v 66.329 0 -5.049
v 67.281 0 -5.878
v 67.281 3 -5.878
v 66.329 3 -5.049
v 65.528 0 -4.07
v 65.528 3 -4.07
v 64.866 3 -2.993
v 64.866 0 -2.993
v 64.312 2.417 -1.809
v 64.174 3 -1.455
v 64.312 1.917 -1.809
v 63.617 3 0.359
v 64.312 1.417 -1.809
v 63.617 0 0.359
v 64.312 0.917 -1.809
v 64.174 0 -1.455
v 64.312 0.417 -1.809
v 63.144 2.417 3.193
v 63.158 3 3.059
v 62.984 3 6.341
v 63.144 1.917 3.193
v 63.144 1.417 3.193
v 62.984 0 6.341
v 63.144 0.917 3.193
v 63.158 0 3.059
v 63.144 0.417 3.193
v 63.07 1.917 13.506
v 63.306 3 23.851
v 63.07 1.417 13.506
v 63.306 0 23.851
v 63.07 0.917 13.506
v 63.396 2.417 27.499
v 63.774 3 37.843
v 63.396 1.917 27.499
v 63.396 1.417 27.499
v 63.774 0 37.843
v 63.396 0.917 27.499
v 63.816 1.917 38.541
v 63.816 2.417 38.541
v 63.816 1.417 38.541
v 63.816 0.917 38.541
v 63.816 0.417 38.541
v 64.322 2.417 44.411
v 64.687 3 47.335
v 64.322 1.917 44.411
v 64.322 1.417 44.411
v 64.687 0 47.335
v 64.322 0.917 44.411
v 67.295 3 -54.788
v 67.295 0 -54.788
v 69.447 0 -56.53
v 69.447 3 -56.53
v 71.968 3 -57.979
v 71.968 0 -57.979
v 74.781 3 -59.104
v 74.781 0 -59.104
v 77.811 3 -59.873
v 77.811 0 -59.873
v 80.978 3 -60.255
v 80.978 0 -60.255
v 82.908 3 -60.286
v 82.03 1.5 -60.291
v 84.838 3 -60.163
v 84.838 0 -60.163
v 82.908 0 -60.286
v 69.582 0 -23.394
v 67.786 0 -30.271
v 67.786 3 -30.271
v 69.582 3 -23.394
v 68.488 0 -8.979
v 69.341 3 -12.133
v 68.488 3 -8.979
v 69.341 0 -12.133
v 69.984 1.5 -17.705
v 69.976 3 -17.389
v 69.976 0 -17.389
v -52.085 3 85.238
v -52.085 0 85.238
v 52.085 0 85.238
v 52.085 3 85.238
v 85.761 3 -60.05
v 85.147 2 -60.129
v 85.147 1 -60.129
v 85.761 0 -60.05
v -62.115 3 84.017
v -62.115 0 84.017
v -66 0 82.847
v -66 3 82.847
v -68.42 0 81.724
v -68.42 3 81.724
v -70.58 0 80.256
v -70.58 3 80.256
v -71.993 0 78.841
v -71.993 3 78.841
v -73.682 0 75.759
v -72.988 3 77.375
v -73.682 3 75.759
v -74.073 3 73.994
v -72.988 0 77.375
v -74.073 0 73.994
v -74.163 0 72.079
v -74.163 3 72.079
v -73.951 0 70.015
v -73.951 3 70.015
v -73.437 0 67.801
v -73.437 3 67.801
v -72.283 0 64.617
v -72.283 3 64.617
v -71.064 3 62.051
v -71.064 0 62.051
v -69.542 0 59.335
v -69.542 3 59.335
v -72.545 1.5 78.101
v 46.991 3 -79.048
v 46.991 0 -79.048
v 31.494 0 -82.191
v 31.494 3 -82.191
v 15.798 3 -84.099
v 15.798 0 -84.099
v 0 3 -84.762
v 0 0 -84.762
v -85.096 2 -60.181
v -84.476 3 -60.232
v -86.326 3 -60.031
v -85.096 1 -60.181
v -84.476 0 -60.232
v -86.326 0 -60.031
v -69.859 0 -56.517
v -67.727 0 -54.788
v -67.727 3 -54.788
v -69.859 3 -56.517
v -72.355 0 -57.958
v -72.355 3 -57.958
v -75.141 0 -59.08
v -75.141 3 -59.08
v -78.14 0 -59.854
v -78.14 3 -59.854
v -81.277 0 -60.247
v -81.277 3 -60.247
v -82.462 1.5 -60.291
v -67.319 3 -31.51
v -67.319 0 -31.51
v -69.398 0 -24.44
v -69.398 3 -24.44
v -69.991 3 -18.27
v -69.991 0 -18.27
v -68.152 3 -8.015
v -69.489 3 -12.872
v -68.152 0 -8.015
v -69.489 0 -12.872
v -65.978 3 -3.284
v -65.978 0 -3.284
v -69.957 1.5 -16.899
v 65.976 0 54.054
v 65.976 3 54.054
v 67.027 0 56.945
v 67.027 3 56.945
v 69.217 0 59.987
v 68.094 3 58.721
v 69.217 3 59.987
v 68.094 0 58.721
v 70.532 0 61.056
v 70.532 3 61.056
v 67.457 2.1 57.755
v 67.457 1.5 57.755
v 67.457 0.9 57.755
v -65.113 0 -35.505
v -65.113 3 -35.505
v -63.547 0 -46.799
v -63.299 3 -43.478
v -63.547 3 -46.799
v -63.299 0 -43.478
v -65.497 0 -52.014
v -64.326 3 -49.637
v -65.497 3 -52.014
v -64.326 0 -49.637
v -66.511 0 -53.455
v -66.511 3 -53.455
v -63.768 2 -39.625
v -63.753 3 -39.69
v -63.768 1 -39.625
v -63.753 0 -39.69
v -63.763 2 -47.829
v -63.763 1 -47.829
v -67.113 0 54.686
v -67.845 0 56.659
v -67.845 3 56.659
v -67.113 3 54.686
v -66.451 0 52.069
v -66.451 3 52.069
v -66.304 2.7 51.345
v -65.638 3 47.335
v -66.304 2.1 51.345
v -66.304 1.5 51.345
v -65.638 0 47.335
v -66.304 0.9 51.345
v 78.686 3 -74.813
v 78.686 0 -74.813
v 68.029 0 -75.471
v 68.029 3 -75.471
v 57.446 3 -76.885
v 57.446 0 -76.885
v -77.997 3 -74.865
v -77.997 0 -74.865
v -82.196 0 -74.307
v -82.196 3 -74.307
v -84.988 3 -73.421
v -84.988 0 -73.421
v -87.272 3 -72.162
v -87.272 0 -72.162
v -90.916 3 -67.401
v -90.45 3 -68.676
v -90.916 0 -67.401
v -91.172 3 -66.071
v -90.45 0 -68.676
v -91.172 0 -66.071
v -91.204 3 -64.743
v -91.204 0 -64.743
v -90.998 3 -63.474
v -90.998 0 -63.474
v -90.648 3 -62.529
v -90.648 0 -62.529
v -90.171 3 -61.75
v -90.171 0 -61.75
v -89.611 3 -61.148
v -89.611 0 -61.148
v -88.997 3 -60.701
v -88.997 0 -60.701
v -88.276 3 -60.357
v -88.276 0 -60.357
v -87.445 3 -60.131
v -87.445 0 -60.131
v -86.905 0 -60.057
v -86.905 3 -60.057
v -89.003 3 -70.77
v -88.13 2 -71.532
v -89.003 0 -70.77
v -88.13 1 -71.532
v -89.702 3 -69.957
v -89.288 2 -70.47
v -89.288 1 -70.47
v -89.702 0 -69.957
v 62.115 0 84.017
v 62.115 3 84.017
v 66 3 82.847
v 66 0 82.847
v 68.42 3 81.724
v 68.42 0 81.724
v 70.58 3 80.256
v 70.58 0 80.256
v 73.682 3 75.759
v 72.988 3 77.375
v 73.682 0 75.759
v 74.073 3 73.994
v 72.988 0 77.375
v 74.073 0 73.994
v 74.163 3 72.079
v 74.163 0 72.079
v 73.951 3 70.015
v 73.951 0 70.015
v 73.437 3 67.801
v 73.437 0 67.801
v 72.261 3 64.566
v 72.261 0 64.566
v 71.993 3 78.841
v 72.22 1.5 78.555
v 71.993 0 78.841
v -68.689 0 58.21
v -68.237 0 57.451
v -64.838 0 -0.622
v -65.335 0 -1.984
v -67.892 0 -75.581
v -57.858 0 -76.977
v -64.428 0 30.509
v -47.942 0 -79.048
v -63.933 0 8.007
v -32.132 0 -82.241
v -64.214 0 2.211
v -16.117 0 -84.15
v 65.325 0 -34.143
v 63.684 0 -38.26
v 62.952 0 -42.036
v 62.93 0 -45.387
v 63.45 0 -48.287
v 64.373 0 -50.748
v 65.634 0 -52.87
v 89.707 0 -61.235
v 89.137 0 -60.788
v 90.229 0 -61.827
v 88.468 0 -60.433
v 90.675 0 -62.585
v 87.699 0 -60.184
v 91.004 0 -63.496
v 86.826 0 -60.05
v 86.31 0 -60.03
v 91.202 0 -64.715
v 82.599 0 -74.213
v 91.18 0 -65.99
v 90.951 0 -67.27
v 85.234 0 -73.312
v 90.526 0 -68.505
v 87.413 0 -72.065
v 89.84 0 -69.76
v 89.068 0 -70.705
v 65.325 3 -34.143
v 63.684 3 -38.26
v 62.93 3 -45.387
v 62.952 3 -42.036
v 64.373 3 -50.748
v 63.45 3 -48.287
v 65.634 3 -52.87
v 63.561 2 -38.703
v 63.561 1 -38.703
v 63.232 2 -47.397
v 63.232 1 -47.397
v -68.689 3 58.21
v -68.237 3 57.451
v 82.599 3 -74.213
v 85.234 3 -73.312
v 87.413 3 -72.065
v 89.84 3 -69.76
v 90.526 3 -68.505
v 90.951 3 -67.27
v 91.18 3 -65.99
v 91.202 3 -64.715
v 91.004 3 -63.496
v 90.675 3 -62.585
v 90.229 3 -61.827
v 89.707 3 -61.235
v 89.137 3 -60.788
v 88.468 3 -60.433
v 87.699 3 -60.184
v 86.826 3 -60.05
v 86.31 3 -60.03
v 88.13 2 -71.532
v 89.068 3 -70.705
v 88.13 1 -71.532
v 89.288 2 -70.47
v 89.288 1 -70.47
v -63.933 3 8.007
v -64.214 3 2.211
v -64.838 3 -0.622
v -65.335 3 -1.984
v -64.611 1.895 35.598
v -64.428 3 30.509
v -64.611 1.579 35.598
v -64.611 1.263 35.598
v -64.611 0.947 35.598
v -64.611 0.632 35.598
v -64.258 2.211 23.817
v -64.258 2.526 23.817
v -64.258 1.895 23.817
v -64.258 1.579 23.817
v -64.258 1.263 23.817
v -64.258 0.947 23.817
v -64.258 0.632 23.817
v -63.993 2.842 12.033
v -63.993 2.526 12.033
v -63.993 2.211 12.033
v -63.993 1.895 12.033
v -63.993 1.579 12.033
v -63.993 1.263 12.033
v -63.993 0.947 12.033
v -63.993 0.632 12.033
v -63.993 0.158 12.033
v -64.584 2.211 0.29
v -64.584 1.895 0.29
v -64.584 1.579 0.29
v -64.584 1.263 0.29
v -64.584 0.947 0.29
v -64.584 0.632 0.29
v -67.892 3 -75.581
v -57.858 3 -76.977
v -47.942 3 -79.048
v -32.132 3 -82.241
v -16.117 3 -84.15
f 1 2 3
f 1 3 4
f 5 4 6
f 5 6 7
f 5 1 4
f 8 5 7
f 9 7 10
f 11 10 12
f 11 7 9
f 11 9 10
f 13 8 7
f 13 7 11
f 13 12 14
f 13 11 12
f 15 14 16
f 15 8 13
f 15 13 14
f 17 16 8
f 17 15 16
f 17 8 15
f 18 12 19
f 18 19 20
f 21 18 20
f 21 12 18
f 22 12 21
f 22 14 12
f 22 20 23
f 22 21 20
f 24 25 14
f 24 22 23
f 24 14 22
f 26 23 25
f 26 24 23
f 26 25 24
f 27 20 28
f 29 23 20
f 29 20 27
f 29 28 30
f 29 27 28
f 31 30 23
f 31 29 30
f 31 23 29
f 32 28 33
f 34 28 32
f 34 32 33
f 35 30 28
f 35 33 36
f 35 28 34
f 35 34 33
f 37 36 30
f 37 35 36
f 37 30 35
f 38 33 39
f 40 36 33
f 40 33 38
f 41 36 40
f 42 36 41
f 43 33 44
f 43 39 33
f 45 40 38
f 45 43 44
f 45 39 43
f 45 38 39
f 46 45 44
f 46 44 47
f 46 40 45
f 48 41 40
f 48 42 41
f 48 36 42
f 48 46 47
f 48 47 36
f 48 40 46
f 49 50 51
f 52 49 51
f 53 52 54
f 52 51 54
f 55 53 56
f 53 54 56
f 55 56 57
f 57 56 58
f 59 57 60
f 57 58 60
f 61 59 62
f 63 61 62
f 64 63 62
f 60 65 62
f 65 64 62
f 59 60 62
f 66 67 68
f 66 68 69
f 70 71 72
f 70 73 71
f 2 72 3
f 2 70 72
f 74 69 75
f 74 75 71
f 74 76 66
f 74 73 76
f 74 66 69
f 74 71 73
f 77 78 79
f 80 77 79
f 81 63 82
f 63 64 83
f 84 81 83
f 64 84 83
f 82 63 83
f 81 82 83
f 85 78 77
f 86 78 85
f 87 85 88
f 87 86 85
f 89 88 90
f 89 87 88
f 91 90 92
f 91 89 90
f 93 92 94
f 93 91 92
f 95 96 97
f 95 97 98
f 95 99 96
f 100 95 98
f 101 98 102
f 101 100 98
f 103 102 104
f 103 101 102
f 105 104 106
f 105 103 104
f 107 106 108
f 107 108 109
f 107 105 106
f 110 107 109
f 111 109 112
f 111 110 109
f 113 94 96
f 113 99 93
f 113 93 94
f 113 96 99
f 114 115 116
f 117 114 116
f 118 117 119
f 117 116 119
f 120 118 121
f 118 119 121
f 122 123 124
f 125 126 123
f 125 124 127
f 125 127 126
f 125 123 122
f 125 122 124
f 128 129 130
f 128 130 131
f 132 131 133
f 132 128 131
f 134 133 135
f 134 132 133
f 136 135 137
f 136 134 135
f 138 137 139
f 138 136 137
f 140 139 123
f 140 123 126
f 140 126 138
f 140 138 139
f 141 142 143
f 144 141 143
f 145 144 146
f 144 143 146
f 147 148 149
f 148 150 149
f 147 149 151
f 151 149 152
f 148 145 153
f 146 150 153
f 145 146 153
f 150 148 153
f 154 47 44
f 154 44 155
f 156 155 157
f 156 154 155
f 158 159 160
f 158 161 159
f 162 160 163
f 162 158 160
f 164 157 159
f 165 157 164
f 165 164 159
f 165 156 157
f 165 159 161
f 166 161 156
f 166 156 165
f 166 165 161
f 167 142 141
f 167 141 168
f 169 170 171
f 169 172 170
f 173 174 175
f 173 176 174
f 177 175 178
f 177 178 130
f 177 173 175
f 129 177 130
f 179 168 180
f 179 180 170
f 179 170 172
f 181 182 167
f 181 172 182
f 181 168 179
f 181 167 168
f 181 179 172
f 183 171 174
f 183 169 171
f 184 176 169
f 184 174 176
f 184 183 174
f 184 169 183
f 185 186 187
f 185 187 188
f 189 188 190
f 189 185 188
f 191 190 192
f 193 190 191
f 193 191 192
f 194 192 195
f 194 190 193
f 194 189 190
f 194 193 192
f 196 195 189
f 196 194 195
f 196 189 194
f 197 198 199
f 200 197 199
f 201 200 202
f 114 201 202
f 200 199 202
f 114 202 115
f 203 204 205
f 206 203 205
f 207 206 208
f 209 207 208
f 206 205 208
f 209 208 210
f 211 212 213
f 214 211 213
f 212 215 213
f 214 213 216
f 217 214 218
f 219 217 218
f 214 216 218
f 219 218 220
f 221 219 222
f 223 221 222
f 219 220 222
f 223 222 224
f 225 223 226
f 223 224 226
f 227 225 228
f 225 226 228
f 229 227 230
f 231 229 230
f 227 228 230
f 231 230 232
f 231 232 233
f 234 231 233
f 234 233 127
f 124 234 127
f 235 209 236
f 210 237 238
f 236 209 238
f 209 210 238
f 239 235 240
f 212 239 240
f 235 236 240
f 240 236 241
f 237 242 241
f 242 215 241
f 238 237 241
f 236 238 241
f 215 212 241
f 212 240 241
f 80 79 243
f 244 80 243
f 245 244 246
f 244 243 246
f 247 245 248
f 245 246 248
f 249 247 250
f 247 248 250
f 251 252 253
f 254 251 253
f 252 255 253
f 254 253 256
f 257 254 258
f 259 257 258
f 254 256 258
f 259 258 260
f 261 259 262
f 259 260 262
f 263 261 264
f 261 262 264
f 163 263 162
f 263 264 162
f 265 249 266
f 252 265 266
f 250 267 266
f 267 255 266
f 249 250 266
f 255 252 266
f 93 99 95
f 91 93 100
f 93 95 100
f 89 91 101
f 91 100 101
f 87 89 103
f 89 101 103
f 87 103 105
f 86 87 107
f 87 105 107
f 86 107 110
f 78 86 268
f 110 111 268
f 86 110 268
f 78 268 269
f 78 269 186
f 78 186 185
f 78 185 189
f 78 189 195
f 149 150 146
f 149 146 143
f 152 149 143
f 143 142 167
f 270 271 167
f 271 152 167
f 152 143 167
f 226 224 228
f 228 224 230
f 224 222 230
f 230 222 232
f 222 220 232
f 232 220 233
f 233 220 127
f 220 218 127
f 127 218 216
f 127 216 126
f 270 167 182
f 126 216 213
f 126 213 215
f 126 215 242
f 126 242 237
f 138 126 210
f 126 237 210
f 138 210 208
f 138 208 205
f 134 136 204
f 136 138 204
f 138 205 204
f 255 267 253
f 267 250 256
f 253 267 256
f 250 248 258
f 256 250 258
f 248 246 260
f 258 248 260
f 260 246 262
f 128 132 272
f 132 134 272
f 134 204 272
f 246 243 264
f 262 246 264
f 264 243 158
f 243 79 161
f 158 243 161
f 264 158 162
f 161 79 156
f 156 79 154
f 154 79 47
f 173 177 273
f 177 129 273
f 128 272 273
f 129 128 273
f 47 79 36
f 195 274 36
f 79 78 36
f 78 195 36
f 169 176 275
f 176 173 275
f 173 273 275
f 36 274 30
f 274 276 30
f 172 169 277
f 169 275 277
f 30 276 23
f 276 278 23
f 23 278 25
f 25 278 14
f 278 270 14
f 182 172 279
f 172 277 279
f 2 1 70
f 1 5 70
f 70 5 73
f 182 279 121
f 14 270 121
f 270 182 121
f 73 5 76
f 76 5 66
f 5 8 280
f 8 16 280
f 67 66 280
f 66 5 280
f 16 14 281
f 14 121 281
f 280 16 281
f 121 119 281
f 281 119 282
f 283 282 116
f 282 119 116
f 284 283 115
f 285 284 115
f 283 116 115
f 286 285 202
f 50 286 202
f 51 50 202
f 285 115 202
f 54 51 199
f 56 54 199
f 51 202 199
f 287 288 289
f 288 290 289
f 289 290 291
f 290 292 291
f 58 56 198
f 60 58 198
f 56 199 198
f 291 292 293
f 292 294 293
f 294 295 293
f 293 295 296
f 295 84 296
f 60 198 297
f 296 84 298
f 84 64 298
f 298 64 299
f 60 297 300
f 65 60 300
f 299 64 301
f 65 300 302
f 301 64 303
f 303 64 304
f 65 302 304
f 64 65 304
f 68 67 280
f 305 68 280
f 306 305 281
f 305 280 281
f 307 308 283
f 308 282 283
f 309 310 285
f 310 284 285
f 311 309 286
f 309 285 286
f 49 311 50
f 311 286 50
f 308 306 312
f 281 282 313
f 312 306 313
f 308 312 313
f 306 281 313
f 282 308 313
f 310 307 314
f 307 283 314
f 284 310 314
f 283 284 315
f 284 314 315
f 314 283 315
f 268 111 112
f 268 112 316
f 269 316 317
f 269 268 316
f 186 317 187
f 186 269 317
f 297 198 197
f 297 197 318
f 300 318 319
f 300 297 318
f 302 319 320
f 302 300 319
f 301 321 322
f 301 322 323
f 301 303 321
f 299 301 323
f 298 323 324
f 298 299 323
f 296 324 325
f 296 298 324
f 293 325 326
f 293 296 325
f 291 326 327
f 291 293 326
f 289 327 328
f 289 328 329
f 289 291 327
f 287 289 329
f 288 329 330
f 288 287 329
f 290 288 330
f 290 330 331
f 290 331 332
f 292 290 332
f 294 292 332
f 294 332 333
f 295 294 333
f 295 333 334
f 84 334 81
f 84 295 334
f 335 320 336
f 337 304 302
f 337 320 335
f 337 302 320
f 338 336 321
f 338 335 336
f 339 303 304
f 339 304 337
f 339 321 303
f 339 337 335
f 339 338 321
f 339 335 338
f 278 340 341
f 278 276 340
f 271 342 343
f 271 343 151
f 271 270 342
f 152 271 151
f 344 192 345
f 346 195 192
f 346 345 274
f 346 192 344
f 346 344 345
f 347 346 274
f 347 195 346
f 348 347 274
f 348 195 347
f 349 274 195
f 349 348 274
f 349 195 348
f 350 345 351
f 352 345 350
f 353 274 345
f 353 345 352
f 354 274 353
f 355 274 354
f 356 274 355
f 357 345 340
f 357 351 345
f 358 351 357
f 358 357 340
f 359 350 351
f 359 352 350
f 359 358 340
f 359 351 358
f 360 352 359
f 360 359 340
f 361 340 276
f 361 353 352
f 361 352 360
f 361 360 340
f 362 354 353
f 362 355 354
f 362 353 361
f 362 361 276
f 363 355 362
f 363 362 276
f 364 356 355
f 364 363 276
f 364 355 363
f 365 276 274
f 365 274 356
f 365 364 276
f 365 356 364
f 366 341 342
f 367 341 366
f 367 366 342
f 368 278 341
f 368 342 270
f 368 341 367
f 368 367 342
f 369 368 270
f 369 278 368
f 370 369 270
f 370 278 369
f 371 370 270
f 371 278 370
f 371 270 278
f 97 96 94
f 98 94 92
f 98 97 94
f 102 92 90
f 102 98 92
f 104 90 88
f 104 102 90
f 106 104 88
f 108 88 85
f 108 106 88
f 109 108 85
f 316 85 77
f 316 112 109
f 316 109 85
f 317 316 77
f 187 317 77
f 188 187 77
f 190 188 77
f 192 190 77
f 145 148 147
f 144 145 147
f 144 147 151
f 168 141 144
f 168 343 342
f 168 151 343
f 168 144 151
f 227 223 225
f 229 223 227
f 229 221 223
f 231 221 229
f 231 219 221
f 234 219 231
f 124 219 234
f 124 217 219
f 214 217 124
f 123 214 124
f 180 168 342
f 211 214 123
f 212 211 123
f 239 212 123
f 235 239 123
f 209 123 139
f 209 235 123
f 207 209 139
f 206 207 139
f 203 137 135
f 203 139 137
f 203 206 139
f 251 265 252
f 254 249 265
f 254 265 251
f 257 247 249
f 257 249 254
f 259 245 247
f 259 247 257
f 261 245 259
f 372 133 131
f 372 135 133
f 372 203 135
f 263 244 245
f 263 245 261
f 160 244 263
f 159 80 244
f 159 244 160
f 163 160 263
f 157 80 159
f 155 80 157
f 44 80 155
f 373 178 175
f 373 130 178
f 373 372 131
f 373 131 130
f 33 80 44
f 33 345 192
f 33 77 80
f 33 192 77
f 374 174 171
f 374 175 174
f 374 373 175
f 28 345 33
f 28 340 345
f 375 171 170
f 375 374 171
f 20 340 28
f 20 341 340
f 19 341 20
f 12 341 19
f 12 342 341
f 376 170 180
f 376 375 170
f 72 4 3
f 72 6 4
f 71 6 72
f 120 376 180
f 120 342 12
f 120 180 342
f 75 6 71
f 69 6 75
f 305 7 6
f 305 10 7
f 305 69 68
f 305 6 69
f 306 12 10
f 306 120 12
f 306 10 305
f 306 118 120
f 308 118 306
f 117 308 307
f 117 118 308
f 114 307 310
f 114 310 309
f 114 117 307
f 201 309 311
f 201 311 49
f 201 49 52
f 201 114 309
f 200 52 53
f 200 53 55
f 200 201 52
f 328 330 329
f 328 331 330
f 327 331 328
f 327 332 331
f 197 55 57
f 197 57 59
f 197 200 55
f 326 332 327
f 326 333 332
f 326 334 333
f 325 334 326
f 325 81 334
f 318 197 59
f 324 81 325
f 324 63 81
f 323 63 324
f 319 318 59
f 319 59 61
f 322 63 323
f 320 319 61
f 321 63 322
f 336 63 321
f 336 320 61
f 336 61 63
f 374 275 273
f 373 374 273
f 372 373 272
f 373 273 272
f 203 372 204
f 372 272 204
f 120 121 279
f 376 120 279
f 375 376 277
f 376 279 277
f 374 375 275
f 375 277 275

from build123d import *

# Parameters (mm, degrees)
EXTRUDE_1_DEPTH = 3


with BuildPart() as part:
    # 草图1 → 凸台-拉伸1 (new body)
    with BuildSketch(Plane(origin=(0, 0, 0), x_dir=(1, 0, 0), z_dir=(0, 1, 0))):
        with BuildLine():
            Line((0, -85.237738925), (52.08455714, -85.237738925))
            add(Edge.make_bspline(
                [(52.08455714, -85.237738925), (83.131353316, -83.963442969), (70.531928888, -61.056271567)],
                knots=[0, 0, 0, 0.91576418, 0.91576418, 0.91576418], degree=2))
            add(Edge.make_bspline(
                [(64.686979765, -47.335345252), (64.821728452, -48.22885898), (65.093128633, -50.015668979), (65.515155467, -52.234660938), (65.946662506, -53.991070652), (66.337115564, -55.291267739), (66.823261096, -56.557684193), (67.433421369, -57.768689415), (68.186549634, -58.894674775), (69.089475072, -59.904951843), (69.899928779, -60.600614164), (70.397522986, -60.962598407), (70.531928888, -61.056271567)],
                knots=[0, 0, 0, 0, 0.03125, 0.0625, 0.078125, 0.09375, 0.109375, 0.125, 0.140625, 0.15625, 0.171875, 0.177544855, 0.177544855, 0.177544855, 0.177544855], degree=3))
            add(Edge.make_bspline(
                [(67.281190845, 5.878024568), (66.896150113, 5.604067681), (66.17820277, 4.954075775), (65.443341839, 3.984844748), (64.938700468, 3.142617887), (64.602832741, 2.486533462), (64.306406192, 1.811794699), (64.046527331, 1.122513569), (63.82116748, 0.421125393), (63.628358492, -0.290103239), (63.466128453, -1.008847892), (63.332437978, -1.733031566), (63.224920724, -2.461279505), (63.112896984, -3.436590381), (63.04248237, -4.416759867), (63.002674943, -5.39935773), (62.985358555, -6.136929173), (62.977857057, -6.874572053), (62.977765693, -7.612059791), (62.982878051, -8.349301424), (62.991452287, -9.086301707), (63.002218337, -9.823125162), (63.018489212, -10.805396372), (63.040788209, -12.033099303), (63.117509988, -15.961444796), (63.209965223, -19.888985412), (63.30476302, -23.816659201), (63.346660287, -25.535031616), (63.38326061, -27.007933212), (63.421035997, -28.480829039), (63.466381834, -30.199198036), (63.537017062, -32.653910516), (63.649386664, -35.598757346), (63.806392131, -38.54169042), (64.021636354, -41.480498428), (64.260256253, -43.924290625), (64.493829102, -45.874662228), (64.622628022, -46.848447014), (64.686979765, -47.335345252)],
                knots=[0.42243117, 0.42243117, 0.42243117, 0.42243117, 0.4375, 0.453125, 0.4609375, 0.46875, 0.4765625, 0.484375, 0.4921875, 0.5, 0.5078125, 0.515625, 0.5234375, 0.53125, 0.546875, 0.5546875, 0.5625, 0.5703125, 0.578125, 0.5859375, 0.59375, 0.6015625, 0.609375, 0.625, 0.640625, 0.734375, 0.75, 0.765625, 0.7890625, 0.796875, 0.8125, 0.84375, 0.875, 0.90625, 0.9375, 0.96875, 0.984375, 1, 1, 1, 1], degree=3))
            add(Edge.make_bspline(
                [(67.78565705, 30.270686681), (72.435451847, 17.336518953), (67.281190845, 5.878024568)],
                knots=[0.041125556, 0.041125556, 0.041125556, 0.901853171, 0.901853171, 0.901853171], degree=2))
            add(Edge.make_bspline(
                [(67.78565705, 30.270686681), (61.777966314, 38.050300603), (60.870236454, 48.571265725), (67.294682301, 54.787889309)],
                knots=[0.782114211, 0.782114211, 0.782114211, 0.782114211, 1, 1, 1, 1], degree=3))
            add(Edge.make_bspline(
                [(67.294682301, 54.787889309), (70.741983298, 58.123674712), (77.208516837, 60.562602986), (83.906576895, 60.259476119), (84.838000271, 60.163270829)],
                knots=[0, 0, 0, 0, 0.116915593, 0.136015961, 0.136015961, 0.136015961, 0.136015961], degree=3))
            add(Edge.make_bspline(
                [(84.838000271, 60.163270829), (85.146981152, 60.131356669), (85.454953169, 60.093539936), (85.761414982, 60.04983651)],
                knots=[0.136015961, 0.136015961, 0.136015961, 0.136015961, 0.142352122, 0.142352122, 0.142352122, 0.142352122], degree=3))
            add(Edge.make_bspline(
                [(78.685847617, 74.813097523), (82.796268879, 74.469500522), (85.960946813, 73.439665414), (92.408972751, 67.859232167), (92.136253049, 59.602987515), (85.761414982, 60.04983651)],
                knots=[0.020704184, 0.020704184, 0.020704184, 0.020704184, 0.398408746, 0.457074244, 0.967673839, 0.967673839, 0.967673839, 0.967673839], degree=3))
            ThreePointArc((78.685847617, 74.813097523), (62.72522618, 76.083545277), (46.990944234, 79.047975372))
            ThreePointArc((46.990944234, 79.047975372), (23.665112301, 83.299995302), (0, 84.761695887))
            Line((0, 84.761695887), (0, -85.237738925))
        make_face()
        with BuildLine():
            Line((-52.08455714, -85.237738925), (0, -85.237738925))
            Line((0, -85.237738925), (0, 84.761695887))
            ThreePointArc((0, 84.761695887), (-24.143998295, 83.356825814), (-47.941899914, 79.047975372))
            ThreePointArc((-47.941899914, 79.047975372), (-62.863562899, 76.194384461), (-77.997336876, 74.864763259))
            add(Edge.make_bspline(
                [(-77.997336876, 74.864763259), (-82.495528452, 74.563753901), (-85.819969627, 73.561673882), (-92.303254227, 67.950726086), (-92.148043047, 60.049699914), (-86.326016832, 60.03052313)],
                knots=[0, 0, 0, 0, 0.398408746, 0.457074244, 0.95214781, 0.95214781, 0.95214781, 0.95214781], degree=3))
            add(Edge.make_bspline(
                [(-84.476216485, 60.232119747), (-85.0964702, 60.188510883), (-85.714404489, 60.121269756), (-86.326016832, 60.03052313)],
                knots=[0.130603984, 0.130603984, 0.130603984, 0.130603984, 0.143267662, 0.143267662, 0.143267662, 0.143267662], degree=3))
            add(Edge.make_bspline(
                [(-67.726534157, 54.787889309), (-71.173835153, 58.123674712), (-77.383070006, 60.465559796), (-83.805773382, 60.279257331), (-84.476216485, 60.232119747)],
                knots=[0, 0, 0, 0, 0.116915593, 0.130603984, 0.130603984, 0.130603984, 0.130603984], degree=3))
            add(Edge.make_bspline(
                [(-67.318940817, 31.510044314), (-62.135044836, 39.136673255), (-61.6373547, 48.895686695), (-67.726534157, 54.787889309)],
                knots=[0.793484807, 0.793484807, 0.793484807, 0.793484807, 1, 1, 1, 1], degree=3))
            add(Edge.make_bspline(
                [(-67.318940817, 31.510044314), (-73.265342886, 16.40111188), (-65.978257792, 3.284039205)],
                knots=[0, 0, 0, 1, 1, 1], degree=2))
            add(Edge.make_bspline(
                [(-65.637935545, -47.335345136), (-65.373308793, -45.388720399), (-64.924382386, -41.484539572), (-64.643005293, -36.57962883), (-64.490248654, -32.653889947), (-64.374999228, -28.726358209), (-64.257498755, -23.816569768), (-64.116872777, -17.924883735), (-64.009829941, -13.015026184), (-63.947711012, -9.577682419), (-63.927494686, -7.612641533), (-63.933645618, -5.646217447), (-64.01771328, -3.681321264), (-64.270091341, -1.731417529), (-64.514844339, -0.526384591), (-64.771670226, 0.42231228), (-64.996859302, 1.123821794), (-65.256715294, 1.813004408), (-65.553427674, 2.487173233), (-65.802759649, 2.973687329), (-65.950639045, 3.235914899), (-65.978257792, 3.284039205)],
                knots=[0, 0, 0, 0, 0.0625, 0.125, 0.15625, 0.1875, 0.25, 0.3125, 0.375, 0.40625, 0.421875, 0.4375, 0.46875, 0.484375, 0.5, 0.5078125, 0.515625, 0.5234375, 0.53125, 0.5390625, 0.540827672, 0.540827672, 0.540827672, 0.540827672], degree=3))
            add(Edge.make_bspline(
                [(-67.844738769, -56.659038975), (-67.828076267, -56.622229396), (-67.719460833, -56.379300174), (-67.532147702, -55.924331546), (-67.301765295, -55.286577262), (-67.095120003, -54.640057247), (-66.846182809, -53.769830042), (-66.575335176, -52.672735761), (-66.298095135, -51.346567808), (-66.056394972, -50.013457449), (-65.839906621, -48.675631298), (-65.705201894, -47.782116323), (-65.637935545, -47.335345136)],
                knots=[0.889226319, 0.889226319, 0.889226319, 0.889226319, 0.890625, 0.8984375, 0.90625, 0.9140625, 0.921875, 0.9375, 0.953125, 0.96875, 0.984375, 1, 1, 1, 1], degree=3))
            add(Edge.make_bspline(
                [(-69.542046847, -59.335240196), (-69.41095783, -59.185836173), (-69.140909763, -58.858719517), (-68.761007501, -58.331544507), (-68.303961157, -57.600902177), (-68.014217124, -57.033438144), (-67.844738769, -56.659038975)],
                knots=[0.852481845, 0.852481845, 0.852481845, 0.852481845, 0.859375, 0.8671875, 0.875, 0.889226319, 0.889226319, 0.889226319, 0.889226319], degree=3))
            add(Edge.make_bspline(
                [(-52.08455714, -85.237738925), (-84.277652341, -83.916393856), (-69.542046847, -59.335240196)],
                knots=[0, 0, 0, 0.949575707, 0.949575707, 0.949575707], degree=2))
        make_face()
    extrude(amount=EXTRUDE_1_DEPTH)


solid = part.part
